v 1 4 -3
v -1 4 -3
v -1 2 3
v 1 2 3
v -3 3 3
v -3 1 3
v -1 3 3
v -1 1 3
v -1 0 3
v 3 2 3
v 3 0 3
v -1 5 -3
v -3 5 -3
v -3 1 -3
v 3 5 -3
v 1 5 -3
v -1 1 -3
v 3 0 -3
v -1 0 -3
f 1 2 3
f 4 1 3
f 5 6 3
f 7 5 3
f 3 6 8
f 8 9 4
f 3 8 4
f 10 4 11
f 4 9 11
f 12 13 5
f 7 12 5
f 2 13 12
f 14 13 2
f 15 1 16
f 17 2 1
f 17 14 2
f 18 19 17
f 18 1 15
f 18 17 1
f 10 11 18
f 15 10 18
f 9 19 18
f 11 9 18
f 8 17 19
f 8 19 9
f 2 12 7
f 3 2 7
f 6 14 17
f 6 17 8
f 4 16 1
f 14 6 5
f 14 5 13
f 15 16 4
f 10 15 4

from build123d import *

# Parameters (mm, degrees)
SKETCH1_W           = 6
SKETCH1_H           = 6
BOSS_EXTRUDE1_DEPTH = 5
SKETCH2_W           = 6
SKETCH2_H           = 1
CUT_EXTRUDE1_DEPTH  = 2
CUT_EXTRUDE2_DEPTH  = 2
CUT_EXTRUDE3_DEPTH  = 2


with BuildPart() as part:
    # Sketch1 → Boss-Extrude1 (new body)
    with BuildSketch(Plane(origin=(0, 0, 0), x_dir=(1, 0, 0), z_dir=(0, 1, 0))):
        Rectangle(SKETCH1_W, SKETCH1_H)
    extrude(amount=BOSS_EXTRUDE1_DEPTH)

    # Sketch2 → Cut-Extrude1 (cut)
    with BuildSketch(Plane.ZY.offset(3)):
        Polygon((3, 5), (-3, 5), (3, 3), align=None)
        with Locations((0, 0.5)):
            Rectangle(SKETCH2_W, SKETCH2_H)
    extrude(amount=-CUT_EXTRUDE1_DEPTH, mode=Mode.SUBTRACT)

    # Sketch3 → Cut-Extrude2 (cut)
    with BuildSketch(Plane.ZY.offset(1)):
        Polygon((-3, 5), (-3, 4), (3, 2), (3, 3), align=None)
        Polygon((3, 3), (3, 5), (-3, 5), align=None)
    extrude(amount=-CUT_EXTRUDE2_DEPTH, mode=Mode.SUBTRACT)

    # Sketch4 → Cut-Extrude3 (cut)
    with BuildSketch(Plane.ZY.offset(-1)):
        Polygon((-3, 5), (3, 2), (3, 5), align=None)
    extrude(amount=-CUT_EXTRUDE3_DEPTH, mode=Mode.SUBTRACT)


solid = part.part
